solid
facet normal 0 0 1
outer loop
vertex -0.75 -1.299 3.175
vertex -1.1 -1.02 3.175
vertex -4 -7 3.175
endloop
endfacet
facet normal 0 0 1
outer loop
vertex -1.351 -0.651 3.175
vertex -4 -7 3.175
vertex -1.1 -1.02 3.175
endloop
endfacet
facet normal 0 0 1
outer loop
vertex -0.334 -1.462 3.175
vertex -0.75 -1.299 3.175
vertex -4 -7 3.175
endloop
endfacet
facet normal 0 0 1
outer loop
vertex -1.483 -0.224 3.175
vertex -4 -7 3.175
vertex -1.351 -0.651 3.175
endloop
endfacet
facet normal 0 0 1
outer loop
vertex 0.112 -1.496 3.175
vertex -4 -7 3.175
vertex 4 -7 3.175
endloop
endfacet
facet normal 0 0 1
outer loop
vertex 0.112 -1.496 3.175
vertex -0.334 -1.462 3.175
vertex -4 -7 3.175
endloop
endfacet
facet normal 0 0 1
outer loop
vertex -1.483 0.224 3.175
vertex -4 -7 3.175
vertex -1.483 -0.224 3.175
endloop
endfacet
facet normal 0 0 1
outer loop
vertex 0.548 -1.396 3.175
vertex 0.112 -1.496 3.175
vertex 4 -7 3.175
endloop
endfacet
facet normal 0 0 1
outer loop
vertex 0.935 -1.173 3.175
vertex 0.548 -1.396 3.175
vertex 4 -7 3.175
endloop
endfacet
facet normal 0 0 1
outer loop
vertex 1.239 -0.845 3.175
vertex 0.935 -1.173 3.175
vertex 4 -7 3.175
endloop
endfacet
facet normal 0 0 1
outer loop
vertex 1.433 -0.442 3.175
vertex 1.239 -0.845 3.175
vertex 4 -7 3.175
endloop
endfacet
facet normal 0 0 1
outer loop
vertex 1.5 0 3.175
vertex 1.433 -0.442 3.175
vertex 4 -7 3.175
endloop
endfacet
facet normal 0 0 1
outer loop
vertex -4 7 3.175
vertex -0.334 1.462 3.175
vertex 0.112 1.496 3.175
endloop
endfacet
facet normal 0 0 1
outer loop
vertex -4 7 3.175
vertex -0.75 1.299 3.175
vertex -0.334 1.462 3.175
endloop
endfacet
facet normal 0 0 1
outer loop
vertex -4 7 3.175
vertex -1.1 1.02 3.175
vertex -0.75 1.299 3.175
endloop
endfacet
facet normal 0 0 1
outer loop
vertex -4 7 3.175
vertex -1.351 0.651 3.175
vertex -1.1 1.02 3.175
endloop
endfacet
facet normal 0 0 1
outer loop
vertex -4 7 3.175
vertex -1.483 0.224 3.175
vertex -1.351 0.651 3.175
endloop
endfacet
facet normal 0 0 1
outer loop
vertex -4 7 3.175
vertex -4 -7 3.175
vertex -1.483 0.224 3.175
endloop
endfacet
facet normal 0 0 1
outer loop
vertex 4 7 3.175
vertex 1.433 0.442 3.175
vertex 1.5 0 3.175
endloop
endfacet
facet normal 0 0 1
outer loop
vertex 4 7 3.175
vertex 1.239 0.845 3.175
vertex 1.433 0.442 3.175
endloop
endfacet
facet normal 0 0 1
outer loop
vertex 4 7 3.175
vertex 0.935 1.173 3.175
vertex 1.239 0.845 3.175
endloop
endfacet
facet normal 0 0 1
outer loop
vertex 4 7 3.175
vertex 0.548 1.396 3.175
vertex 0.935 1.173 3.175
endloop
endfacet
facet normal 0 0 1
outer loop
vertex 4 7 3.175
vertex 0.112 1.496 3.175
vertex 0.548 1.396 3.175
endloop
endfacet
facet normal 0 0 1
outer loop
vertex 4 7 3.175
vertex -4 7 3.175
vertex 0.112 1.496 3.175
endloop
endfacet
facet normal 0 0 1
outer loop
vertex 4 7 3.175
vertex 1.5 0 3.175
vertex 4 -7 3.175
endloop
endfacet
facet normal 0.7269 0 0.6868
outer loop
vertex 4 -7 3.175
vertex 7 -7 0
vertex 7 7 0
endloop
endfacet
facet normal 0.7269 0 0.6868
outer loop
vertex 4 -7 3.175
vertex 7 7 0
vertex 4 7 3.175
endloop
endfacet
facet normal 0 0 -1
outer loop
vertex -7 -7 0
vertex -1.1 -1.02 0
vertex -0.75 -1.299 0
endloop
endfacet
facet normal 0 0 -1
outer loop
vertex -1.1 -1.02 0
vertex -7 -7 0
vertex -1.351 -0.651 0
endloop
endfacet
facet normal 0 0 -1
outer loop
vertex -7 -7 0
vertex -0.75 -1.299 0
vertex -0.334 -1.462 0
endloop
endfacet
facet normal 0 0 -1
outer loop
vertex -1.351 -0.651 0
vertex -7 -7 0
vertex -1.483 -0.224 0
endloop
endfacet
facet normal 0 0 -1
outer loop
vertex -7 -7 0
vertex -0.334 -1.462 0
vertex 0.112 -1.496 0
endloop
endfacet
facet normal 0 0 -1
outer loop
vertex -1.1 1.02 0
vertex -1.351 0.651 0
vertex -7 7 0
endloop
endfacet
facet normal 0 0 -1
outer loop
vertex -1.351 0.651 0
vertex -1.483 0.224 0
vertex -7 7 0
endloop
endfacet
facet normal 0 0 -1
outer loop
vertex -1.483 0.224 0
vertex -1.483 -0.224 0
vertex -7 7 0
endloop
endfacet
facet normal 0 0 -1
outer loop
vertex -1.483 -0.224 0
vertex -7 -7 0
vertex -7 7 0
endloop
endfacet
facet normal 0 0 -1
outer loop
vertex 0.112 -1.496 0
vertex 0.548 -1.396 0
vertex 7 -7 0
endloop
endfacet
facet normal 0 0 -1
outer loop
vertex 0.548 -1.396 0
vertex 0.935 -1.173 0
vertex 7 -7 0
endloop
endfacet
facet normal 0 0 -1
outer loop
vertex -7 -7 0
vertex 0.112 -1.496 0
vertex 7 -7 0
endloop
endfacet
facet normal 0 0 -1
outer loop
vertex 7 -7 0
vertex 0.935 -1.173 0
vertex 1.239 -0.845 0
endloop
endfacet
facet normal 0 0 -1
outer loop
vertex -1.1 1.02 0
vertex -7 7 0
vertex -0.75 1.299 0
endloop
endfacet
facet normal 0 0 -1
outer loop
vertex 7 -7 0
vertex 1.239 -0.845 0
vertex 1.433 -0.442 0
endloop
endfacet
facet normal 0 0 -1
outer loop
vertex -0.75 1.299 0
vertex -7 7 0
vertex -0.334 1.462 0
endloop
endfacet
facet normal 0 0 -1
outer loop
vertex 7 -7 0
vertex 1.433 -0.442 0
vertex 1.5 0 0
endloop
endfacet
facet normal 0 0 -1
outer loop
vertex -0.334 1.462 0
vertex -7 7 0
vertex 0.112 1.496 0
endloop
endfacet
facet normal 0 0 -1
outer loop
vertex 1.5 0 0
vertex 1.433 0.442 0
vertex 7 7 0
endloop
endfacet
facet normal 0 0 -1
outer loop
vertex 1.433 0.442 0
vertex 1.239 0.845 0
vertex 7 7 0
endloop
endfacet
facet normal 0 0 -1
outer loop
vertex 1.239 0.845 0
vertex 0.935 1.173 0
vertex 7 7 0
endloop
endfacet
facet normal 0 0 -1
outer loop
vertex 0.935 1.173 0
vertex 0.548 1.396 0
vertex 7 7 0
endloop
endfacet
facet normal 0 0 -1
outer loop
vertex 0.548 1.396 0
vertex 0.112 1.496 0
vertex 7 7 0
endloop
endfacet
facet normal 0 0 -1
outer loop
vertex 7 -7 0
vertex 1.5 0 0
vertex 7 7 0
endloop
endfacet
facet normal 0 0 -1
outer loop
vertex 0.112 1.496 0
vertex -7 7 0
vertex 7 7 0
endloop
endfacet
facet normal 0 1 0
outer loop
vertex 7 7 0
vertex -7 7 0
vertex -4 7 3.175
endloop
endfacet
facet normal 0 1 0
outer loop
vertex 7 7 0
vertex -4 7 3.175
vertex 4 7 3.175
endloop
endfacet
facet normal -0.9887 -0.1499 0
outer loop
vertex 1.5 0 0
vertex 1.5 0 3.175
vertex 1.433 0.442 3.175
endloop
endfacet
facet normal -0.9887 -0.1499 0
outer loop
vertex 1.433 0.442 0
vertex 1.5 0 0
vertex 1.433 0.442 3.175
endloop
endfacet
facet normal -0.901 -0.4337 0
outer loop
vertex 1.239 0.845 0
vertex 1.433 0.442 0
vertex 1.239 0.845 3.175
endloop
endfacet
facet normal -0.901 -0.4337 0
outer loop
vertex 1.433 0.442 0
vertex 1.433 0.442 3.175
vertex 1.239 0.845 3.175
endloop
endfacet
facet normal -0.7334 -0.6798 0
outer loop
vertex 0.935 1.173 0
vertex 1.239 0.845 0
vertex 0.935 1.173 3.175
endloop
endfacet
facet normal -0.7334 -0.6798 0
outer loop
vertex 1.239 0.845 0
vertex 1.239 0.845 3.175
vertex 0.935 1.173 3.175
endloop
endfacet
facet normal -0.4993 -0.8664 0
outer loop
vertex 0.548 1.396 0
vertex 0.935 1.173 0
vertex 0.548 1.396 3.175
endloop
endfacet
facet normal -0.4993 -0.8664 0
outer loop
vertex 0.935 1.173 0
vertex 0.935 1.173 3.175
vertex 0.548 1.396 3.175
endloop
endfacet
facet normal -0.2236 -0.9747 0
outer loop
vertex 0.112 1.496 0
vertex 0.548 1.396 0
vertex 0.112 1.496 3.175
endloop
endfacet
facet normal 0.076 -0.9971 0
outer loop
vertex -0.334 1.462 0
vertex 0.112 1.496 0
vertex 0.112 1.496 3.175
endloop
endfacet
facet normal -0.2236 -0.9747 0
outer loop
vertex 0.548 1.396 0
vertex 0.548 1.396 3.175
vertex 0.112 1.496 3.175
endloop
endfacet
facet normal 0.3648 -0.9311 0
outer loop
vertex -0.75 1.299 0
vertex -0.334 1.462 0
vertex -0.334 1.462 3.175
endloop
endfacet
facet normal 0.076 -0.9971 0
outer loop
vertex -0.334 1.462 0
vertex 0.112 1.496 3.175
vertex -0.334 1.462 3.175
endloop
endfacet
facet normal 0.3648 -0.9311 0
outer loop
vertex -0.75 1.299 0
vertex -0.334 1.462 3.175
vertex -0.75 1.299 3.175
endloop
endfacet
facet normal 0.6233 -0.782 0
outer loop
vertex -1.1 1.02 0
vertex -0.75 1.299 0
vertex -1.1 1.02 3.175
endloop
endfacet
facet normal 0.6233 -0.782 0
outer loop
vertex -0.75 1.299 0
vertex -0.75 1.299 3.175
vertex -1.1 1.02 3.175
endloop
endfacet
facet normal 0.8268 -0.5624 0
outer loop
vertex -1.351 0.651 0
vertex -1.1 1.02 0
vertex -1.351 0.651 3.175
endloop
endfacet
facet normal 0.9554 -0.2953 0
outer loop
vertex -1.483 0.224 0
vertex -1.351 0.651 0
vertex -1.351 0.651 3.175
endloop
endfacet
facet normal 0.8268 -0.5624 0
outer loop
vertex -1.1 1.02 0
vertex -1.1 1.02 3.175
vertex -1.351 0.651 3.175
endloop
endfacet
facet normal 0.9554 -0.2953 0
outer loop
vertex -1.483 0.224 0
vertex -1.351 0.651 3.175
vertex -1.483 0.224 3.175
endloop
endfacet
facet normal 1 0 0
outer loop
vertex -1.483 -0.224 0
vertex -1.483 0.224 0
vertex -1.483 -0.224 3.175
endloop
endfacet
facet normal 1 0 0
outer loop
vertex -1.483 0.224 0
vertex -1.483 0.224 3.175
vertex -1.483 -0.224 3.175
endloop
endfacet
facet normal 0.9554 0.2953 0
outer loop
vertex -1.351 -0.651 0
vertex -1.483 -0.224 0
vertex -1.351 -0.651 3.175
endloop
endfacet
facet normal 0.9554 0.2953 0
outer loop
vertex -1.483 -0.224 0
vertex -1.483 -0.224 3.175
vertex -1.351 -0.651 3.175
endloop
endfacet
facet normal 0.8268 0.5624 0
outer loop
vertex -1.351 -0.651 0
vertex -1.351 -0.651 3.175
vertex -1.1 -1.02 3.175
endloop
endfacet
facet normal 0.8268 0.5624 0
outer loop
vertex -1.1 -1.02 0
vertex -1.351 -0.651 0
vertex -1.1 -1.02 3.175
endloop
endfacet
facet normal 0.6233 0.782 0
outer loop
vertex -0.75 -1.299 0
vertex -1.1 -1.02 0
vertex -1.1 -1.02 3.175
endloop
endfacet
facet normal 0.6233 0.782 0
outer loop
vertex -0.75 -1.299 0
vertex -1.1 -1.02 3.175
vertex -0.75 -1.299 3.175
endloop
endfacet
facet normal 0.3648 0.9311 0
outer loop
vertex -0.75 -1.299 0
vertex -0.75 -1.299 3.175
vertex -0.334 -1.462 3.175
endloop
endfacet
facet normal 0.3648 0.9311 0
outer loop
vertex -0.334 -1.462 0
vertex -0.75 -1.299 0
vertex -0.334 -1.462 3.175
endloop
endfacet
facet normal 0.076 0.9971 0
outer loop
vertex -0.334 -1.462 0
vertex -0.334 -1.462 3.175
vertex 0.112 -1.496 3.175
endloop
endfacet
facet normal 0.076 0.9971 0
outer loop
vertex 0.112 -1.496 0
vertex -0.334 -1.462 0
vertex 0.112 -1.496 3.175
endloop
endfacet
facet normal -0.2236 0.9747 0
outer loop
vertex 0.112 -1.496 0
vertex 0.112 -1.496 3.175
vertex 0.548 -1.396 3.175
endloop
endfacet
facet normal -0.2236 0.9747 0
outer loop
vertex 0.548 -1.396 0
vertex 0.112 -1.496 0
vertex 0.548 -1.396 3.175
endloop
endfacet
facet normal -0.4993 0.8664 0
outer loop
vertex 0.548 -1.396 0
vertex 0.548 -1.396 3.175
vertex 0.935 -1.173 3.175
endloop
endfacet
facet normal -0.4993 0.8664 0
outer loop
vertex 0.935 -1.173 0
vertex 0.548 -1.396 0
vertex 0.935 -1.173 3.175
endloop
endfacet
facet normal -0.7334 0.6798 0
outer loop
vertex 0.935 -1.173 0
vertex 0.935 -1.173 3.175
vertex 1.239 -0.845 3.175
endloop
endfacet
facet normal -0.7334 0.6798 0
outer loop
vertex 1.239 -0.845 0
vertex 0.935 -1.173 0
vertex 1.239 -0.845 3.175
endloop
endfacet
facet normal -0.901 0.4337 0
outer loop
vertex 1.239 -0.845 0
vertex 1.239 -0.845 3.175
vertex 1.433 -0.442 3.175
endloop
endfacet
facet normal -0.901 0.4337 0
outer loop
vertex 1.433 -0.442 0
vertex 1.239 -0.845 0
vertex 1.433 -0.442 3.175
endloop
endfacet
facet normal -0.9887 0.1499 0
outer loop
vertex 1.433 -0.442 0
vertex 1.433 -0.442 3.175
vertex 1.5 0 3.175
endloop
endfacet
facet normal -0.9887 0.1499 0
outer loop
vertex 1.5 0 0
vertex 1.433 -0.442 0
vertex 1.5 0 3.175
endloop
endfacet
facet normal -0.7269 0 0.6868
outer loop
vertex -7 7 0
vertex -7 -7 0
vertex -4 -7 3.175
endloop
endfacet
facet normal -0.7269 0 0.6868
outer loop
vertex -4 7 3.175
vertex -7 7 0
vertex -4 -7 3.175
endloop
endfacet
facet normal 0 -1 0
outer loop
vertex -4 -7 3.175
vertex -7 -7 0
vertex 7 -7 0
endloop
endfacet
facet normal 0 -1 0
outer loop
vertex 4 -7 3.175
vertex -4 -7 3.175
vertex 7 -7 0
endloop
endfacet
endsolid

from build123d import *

# Parameters (mm, degrees)
ESBO_O1_W                = 14
ESBO_O1_H                = 14
RESSALTO_EXTRUS_O1_DEPTH = 3.175
CORTE_EXTRUS_O1_DEPTH    = 15
ESBO_O10_R               = 1.5
CORTE_EXTRUS_O2_DEPTH    = 4.175


with BuildPart() as part:
    # Esboço1 → Ressalto-extrusão1 (new body)
    with BuildSketch(Plane.XY):
        Rectangle(ESBO_O1_W, ESBO_O1_H)
    extrude(amount=RESSALTO_EXTRUS_O1_DEPTH)

    # Esboço2 → Corte-extrusão1 (cut, through all)
    with BuildSketch(Plane.XZ.offset(7)):
        Polygon((-4, 3.175), (-7, 3.175), (-7, 0), align=None)
        Polygon((4, 3.175), (7, 3.175), (7, 0), align=None)
    extrude(amount=-CORTE_EXTRUS_O1_DEPTH, mode=Mode.SUBTRACT)

    # Esboço10 → Corte-extrusão2 (cut, through all)
    with BuildSketch(Plane.XY.offset(3.175)):
        Circle(ESBO_O10_R)
    extrude(amount=-CORTE_EXTRUS_O2_DEPTH, mode=Mode.SUBTRACT)


solid = part.part
